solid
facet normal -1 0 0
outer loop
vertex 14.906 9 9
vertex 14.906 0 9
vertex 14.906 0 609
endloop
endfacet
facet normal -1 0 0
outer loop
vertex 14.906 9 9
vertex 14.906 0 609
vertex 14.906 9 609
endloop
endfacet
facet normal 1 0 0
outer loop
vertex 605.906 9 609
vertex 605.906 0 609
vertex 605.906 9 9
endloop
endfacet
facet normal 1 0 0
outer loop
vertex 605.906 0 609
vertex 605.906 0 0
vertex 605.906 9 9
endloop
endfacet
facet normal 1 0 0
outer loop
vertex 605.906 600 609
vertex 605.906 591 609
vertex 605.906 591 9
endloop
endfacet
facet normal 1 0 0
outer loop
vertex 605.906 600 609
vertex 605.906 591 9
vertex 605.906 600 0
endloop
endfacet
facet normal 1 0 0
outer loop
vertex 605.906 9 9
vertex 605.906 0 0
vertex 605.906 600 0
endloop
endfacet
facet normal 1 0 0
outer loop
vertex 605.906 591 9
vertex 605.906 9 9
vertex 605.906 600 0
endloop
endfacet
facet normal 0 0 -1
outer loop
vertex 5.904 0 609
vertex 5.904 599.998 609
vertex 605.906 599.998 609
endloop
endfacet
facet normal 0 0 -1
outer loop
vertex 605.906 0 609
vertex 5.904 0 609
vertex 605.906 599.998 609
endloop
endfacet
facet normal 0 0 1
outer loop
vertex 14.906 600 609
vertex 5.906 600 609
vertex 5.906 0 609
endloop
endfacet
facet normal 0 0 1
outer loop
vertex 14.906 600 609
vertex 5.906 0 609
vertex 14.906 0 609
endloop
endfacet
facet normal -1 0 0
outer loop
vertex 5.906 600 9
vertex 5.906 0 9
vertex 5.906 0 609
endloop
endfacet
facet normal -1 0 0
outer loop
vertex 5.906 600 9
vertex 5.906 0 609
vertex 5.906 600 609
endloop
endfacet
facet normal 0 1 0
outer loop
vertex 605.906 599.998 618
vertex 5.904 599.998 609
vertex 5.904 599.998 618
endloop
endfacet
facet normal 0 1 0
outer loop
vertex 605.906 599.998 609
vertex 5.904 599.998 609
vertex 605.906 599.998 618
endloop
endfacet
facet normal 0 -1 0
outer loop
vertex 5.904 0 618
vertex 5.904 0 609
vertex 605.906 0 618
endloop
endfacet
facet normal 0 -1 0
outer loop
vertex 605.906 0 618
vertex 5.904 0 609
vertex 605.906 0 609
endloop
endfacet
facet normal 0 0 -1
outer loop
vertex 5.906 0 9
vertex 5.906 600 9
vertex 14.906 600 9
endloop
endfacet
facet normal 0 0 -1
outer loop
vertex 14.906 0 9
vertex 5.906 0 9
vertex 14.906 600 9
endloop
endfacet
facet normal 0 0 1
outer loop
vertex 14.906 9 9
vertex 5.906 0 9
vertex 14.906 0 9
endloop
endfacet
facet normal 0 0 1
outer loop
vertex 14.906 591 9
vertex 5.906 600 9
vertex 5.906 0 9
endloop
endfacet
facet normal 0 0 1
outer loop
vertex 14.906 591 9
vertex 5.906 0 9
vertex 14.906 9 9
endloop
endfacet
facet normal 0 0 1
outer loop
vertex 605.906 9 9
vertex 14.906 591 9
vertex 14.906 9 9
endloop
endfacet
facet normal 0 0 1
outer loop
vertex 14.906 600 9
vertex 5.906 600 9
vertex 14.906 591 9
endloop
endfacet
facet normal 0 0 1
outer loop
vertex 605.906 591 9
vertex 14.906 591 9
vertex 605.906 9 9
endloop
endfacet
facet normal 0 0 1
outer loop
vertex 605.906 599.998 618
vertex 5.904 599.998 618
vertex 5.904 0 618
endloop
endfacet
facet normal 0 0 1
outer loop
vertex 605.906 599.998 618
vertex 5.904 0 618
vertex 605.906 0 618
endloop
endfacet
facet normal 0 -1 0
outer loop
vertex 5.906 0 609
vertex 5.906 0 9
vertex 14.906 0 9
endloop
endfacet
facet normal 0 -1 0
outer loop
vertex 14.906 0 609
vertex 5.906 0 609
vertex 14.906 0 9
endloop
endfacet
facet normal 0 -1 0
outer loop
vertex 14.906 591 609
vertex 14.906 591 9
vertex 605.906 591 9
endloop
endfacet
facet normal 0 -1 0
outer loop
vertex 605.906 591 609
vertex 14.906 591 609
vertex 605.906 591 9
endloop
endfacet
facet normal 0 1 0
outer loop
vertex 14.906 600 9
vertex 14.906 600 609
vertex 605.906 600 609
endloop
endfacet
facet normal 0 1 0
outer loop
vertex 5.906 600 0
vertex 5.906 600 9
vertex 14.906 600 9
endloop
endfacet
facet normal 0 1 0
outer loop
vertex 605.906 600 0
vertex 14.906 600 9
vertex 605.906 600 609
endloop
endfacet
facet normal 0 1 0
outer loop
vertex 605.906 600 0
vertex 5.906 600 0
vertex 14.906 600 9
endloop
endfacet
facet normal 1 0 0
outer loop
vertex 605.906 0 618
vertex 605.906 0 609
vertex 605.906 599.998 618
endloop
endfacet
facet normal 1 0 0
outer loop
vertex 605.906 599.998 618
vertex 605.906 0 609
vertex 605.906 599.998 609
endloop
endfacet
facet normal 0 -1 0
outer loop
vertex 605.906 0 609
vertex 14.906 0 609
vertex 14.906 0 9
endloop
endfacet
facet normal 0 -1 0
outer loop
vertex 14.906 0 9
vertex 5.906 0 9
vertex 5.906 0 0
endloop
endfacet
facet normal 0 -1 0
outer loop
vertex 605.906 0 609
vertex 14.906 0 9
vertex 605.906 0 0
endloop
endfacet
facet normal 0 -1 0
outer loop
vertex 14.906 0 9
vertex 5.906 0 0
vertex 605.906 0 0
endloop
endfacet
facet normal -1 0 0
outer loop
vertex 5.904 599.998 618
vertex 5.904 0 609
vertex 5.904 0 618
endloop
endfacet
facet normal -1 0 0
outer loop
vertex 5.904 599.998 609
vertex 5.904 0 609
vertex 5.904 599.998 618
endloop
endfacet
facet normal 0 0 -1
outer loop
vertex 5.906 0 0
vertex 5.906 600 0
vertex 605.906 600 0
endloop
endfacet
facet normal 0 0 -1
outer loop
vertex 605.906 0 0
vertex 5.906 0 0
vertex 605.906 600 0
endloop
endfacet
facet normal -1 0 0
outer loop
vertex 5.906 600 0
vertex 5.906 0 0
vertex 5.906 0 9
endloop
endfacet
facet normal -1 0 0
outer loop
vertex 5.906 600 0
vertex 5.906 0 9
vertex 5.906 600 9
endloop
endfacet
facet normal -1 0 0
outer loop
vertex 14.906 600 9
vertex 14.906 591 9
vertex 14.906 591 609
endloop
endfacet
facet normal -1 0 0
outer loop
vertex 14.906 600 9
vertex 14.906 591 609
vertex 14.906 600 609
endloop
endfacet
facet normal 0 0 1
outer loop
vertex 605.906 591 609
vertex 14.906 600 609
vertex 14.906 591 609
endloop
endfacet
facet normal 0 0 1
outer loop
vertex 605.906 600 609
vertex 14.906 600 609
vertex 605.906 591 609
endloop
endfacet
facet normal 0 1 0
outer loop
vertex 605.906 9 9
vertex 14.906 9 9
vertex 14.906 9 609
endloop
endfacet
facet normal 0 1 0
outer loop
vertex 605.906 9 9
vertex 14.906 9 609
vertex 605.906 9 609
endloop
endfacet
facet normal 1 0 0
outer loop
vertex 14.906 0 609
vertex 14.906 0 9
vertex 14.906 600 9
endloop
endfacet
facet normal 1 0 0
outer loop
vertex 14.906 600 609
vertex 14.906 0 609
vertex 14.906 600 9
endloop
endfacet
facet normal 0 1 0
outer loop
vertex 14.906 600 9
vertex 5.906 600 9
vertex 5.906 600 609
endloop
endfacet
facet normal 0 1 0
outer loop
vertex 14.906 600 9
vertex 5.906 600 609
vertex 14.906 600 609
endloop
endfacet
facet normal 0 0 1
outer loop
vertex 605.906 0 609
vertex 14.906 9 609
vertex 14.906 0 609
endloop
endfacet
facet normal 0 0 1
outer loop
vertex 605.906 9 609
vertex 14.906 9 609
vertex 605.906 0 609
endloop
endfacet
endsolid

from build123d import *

# Parameters (mm, degrees)
F0_W     = 600
F0_H     = 600
F1_DEPTH = 9
F2_W     = 9
F2_H     = 600
F3_DEPTH = 600
F4_W     = 591
F4_H     = 9
F5_DEPTH = 600
F6_W     = 591
F6_H     = 9
F7_DEPTH = 600
F8_W     = 600.0019320287
F8_H     = 599.9984145164
F9_DEPTH = 9


with BuildPart() as f1:
    # F0 (on Top) → F1 (new body)
    with BuildSketch(Plane.XY):
        with Locations((305.9059588239, 300)):
            Rectangle(F0_W, F0_H)
    extrude(amount=F1_DEPTH)

    # F4 (on face) → F5 (join)
    with BuildSketch(Plane.XY.offset(9)):
        with Locations((310.4059588239, 595.5)):
            Rectangle(F4_W, F4_H)
    extrude(amount=F5_DEPTH)

    # F6 (on face) → F7 (join)
    with BuildSketch(Plane.XY.offset(9)):
        with Locations((310.4059588239, 4.5)):
            Rectangle(F6_W, F6_H)
    extrude(amount=F7_DEPTH)


with BuildPart() as f3:
    # F2 (on face) → F3 (new body)
    with BuildSketch(Plane.XY.offset(9)):
        with Locations((10.4059588239, 300)):
            Rectangle(F2_W, F2_H)
    extrude(amount=F3_DEPTH)


with BuildPart() as f9:
    # F8 (on face) → F9 (new body)
    with BuildSketch(Plane.XY.offset(609)):
        with Locations((305.9049928095, 299.9992072582)):
            Rectangle(F8_W, F8_H)
    extrude(amount=F9_DEPTH)


solid = Compound([f1.part, f3.part, f9.part])
